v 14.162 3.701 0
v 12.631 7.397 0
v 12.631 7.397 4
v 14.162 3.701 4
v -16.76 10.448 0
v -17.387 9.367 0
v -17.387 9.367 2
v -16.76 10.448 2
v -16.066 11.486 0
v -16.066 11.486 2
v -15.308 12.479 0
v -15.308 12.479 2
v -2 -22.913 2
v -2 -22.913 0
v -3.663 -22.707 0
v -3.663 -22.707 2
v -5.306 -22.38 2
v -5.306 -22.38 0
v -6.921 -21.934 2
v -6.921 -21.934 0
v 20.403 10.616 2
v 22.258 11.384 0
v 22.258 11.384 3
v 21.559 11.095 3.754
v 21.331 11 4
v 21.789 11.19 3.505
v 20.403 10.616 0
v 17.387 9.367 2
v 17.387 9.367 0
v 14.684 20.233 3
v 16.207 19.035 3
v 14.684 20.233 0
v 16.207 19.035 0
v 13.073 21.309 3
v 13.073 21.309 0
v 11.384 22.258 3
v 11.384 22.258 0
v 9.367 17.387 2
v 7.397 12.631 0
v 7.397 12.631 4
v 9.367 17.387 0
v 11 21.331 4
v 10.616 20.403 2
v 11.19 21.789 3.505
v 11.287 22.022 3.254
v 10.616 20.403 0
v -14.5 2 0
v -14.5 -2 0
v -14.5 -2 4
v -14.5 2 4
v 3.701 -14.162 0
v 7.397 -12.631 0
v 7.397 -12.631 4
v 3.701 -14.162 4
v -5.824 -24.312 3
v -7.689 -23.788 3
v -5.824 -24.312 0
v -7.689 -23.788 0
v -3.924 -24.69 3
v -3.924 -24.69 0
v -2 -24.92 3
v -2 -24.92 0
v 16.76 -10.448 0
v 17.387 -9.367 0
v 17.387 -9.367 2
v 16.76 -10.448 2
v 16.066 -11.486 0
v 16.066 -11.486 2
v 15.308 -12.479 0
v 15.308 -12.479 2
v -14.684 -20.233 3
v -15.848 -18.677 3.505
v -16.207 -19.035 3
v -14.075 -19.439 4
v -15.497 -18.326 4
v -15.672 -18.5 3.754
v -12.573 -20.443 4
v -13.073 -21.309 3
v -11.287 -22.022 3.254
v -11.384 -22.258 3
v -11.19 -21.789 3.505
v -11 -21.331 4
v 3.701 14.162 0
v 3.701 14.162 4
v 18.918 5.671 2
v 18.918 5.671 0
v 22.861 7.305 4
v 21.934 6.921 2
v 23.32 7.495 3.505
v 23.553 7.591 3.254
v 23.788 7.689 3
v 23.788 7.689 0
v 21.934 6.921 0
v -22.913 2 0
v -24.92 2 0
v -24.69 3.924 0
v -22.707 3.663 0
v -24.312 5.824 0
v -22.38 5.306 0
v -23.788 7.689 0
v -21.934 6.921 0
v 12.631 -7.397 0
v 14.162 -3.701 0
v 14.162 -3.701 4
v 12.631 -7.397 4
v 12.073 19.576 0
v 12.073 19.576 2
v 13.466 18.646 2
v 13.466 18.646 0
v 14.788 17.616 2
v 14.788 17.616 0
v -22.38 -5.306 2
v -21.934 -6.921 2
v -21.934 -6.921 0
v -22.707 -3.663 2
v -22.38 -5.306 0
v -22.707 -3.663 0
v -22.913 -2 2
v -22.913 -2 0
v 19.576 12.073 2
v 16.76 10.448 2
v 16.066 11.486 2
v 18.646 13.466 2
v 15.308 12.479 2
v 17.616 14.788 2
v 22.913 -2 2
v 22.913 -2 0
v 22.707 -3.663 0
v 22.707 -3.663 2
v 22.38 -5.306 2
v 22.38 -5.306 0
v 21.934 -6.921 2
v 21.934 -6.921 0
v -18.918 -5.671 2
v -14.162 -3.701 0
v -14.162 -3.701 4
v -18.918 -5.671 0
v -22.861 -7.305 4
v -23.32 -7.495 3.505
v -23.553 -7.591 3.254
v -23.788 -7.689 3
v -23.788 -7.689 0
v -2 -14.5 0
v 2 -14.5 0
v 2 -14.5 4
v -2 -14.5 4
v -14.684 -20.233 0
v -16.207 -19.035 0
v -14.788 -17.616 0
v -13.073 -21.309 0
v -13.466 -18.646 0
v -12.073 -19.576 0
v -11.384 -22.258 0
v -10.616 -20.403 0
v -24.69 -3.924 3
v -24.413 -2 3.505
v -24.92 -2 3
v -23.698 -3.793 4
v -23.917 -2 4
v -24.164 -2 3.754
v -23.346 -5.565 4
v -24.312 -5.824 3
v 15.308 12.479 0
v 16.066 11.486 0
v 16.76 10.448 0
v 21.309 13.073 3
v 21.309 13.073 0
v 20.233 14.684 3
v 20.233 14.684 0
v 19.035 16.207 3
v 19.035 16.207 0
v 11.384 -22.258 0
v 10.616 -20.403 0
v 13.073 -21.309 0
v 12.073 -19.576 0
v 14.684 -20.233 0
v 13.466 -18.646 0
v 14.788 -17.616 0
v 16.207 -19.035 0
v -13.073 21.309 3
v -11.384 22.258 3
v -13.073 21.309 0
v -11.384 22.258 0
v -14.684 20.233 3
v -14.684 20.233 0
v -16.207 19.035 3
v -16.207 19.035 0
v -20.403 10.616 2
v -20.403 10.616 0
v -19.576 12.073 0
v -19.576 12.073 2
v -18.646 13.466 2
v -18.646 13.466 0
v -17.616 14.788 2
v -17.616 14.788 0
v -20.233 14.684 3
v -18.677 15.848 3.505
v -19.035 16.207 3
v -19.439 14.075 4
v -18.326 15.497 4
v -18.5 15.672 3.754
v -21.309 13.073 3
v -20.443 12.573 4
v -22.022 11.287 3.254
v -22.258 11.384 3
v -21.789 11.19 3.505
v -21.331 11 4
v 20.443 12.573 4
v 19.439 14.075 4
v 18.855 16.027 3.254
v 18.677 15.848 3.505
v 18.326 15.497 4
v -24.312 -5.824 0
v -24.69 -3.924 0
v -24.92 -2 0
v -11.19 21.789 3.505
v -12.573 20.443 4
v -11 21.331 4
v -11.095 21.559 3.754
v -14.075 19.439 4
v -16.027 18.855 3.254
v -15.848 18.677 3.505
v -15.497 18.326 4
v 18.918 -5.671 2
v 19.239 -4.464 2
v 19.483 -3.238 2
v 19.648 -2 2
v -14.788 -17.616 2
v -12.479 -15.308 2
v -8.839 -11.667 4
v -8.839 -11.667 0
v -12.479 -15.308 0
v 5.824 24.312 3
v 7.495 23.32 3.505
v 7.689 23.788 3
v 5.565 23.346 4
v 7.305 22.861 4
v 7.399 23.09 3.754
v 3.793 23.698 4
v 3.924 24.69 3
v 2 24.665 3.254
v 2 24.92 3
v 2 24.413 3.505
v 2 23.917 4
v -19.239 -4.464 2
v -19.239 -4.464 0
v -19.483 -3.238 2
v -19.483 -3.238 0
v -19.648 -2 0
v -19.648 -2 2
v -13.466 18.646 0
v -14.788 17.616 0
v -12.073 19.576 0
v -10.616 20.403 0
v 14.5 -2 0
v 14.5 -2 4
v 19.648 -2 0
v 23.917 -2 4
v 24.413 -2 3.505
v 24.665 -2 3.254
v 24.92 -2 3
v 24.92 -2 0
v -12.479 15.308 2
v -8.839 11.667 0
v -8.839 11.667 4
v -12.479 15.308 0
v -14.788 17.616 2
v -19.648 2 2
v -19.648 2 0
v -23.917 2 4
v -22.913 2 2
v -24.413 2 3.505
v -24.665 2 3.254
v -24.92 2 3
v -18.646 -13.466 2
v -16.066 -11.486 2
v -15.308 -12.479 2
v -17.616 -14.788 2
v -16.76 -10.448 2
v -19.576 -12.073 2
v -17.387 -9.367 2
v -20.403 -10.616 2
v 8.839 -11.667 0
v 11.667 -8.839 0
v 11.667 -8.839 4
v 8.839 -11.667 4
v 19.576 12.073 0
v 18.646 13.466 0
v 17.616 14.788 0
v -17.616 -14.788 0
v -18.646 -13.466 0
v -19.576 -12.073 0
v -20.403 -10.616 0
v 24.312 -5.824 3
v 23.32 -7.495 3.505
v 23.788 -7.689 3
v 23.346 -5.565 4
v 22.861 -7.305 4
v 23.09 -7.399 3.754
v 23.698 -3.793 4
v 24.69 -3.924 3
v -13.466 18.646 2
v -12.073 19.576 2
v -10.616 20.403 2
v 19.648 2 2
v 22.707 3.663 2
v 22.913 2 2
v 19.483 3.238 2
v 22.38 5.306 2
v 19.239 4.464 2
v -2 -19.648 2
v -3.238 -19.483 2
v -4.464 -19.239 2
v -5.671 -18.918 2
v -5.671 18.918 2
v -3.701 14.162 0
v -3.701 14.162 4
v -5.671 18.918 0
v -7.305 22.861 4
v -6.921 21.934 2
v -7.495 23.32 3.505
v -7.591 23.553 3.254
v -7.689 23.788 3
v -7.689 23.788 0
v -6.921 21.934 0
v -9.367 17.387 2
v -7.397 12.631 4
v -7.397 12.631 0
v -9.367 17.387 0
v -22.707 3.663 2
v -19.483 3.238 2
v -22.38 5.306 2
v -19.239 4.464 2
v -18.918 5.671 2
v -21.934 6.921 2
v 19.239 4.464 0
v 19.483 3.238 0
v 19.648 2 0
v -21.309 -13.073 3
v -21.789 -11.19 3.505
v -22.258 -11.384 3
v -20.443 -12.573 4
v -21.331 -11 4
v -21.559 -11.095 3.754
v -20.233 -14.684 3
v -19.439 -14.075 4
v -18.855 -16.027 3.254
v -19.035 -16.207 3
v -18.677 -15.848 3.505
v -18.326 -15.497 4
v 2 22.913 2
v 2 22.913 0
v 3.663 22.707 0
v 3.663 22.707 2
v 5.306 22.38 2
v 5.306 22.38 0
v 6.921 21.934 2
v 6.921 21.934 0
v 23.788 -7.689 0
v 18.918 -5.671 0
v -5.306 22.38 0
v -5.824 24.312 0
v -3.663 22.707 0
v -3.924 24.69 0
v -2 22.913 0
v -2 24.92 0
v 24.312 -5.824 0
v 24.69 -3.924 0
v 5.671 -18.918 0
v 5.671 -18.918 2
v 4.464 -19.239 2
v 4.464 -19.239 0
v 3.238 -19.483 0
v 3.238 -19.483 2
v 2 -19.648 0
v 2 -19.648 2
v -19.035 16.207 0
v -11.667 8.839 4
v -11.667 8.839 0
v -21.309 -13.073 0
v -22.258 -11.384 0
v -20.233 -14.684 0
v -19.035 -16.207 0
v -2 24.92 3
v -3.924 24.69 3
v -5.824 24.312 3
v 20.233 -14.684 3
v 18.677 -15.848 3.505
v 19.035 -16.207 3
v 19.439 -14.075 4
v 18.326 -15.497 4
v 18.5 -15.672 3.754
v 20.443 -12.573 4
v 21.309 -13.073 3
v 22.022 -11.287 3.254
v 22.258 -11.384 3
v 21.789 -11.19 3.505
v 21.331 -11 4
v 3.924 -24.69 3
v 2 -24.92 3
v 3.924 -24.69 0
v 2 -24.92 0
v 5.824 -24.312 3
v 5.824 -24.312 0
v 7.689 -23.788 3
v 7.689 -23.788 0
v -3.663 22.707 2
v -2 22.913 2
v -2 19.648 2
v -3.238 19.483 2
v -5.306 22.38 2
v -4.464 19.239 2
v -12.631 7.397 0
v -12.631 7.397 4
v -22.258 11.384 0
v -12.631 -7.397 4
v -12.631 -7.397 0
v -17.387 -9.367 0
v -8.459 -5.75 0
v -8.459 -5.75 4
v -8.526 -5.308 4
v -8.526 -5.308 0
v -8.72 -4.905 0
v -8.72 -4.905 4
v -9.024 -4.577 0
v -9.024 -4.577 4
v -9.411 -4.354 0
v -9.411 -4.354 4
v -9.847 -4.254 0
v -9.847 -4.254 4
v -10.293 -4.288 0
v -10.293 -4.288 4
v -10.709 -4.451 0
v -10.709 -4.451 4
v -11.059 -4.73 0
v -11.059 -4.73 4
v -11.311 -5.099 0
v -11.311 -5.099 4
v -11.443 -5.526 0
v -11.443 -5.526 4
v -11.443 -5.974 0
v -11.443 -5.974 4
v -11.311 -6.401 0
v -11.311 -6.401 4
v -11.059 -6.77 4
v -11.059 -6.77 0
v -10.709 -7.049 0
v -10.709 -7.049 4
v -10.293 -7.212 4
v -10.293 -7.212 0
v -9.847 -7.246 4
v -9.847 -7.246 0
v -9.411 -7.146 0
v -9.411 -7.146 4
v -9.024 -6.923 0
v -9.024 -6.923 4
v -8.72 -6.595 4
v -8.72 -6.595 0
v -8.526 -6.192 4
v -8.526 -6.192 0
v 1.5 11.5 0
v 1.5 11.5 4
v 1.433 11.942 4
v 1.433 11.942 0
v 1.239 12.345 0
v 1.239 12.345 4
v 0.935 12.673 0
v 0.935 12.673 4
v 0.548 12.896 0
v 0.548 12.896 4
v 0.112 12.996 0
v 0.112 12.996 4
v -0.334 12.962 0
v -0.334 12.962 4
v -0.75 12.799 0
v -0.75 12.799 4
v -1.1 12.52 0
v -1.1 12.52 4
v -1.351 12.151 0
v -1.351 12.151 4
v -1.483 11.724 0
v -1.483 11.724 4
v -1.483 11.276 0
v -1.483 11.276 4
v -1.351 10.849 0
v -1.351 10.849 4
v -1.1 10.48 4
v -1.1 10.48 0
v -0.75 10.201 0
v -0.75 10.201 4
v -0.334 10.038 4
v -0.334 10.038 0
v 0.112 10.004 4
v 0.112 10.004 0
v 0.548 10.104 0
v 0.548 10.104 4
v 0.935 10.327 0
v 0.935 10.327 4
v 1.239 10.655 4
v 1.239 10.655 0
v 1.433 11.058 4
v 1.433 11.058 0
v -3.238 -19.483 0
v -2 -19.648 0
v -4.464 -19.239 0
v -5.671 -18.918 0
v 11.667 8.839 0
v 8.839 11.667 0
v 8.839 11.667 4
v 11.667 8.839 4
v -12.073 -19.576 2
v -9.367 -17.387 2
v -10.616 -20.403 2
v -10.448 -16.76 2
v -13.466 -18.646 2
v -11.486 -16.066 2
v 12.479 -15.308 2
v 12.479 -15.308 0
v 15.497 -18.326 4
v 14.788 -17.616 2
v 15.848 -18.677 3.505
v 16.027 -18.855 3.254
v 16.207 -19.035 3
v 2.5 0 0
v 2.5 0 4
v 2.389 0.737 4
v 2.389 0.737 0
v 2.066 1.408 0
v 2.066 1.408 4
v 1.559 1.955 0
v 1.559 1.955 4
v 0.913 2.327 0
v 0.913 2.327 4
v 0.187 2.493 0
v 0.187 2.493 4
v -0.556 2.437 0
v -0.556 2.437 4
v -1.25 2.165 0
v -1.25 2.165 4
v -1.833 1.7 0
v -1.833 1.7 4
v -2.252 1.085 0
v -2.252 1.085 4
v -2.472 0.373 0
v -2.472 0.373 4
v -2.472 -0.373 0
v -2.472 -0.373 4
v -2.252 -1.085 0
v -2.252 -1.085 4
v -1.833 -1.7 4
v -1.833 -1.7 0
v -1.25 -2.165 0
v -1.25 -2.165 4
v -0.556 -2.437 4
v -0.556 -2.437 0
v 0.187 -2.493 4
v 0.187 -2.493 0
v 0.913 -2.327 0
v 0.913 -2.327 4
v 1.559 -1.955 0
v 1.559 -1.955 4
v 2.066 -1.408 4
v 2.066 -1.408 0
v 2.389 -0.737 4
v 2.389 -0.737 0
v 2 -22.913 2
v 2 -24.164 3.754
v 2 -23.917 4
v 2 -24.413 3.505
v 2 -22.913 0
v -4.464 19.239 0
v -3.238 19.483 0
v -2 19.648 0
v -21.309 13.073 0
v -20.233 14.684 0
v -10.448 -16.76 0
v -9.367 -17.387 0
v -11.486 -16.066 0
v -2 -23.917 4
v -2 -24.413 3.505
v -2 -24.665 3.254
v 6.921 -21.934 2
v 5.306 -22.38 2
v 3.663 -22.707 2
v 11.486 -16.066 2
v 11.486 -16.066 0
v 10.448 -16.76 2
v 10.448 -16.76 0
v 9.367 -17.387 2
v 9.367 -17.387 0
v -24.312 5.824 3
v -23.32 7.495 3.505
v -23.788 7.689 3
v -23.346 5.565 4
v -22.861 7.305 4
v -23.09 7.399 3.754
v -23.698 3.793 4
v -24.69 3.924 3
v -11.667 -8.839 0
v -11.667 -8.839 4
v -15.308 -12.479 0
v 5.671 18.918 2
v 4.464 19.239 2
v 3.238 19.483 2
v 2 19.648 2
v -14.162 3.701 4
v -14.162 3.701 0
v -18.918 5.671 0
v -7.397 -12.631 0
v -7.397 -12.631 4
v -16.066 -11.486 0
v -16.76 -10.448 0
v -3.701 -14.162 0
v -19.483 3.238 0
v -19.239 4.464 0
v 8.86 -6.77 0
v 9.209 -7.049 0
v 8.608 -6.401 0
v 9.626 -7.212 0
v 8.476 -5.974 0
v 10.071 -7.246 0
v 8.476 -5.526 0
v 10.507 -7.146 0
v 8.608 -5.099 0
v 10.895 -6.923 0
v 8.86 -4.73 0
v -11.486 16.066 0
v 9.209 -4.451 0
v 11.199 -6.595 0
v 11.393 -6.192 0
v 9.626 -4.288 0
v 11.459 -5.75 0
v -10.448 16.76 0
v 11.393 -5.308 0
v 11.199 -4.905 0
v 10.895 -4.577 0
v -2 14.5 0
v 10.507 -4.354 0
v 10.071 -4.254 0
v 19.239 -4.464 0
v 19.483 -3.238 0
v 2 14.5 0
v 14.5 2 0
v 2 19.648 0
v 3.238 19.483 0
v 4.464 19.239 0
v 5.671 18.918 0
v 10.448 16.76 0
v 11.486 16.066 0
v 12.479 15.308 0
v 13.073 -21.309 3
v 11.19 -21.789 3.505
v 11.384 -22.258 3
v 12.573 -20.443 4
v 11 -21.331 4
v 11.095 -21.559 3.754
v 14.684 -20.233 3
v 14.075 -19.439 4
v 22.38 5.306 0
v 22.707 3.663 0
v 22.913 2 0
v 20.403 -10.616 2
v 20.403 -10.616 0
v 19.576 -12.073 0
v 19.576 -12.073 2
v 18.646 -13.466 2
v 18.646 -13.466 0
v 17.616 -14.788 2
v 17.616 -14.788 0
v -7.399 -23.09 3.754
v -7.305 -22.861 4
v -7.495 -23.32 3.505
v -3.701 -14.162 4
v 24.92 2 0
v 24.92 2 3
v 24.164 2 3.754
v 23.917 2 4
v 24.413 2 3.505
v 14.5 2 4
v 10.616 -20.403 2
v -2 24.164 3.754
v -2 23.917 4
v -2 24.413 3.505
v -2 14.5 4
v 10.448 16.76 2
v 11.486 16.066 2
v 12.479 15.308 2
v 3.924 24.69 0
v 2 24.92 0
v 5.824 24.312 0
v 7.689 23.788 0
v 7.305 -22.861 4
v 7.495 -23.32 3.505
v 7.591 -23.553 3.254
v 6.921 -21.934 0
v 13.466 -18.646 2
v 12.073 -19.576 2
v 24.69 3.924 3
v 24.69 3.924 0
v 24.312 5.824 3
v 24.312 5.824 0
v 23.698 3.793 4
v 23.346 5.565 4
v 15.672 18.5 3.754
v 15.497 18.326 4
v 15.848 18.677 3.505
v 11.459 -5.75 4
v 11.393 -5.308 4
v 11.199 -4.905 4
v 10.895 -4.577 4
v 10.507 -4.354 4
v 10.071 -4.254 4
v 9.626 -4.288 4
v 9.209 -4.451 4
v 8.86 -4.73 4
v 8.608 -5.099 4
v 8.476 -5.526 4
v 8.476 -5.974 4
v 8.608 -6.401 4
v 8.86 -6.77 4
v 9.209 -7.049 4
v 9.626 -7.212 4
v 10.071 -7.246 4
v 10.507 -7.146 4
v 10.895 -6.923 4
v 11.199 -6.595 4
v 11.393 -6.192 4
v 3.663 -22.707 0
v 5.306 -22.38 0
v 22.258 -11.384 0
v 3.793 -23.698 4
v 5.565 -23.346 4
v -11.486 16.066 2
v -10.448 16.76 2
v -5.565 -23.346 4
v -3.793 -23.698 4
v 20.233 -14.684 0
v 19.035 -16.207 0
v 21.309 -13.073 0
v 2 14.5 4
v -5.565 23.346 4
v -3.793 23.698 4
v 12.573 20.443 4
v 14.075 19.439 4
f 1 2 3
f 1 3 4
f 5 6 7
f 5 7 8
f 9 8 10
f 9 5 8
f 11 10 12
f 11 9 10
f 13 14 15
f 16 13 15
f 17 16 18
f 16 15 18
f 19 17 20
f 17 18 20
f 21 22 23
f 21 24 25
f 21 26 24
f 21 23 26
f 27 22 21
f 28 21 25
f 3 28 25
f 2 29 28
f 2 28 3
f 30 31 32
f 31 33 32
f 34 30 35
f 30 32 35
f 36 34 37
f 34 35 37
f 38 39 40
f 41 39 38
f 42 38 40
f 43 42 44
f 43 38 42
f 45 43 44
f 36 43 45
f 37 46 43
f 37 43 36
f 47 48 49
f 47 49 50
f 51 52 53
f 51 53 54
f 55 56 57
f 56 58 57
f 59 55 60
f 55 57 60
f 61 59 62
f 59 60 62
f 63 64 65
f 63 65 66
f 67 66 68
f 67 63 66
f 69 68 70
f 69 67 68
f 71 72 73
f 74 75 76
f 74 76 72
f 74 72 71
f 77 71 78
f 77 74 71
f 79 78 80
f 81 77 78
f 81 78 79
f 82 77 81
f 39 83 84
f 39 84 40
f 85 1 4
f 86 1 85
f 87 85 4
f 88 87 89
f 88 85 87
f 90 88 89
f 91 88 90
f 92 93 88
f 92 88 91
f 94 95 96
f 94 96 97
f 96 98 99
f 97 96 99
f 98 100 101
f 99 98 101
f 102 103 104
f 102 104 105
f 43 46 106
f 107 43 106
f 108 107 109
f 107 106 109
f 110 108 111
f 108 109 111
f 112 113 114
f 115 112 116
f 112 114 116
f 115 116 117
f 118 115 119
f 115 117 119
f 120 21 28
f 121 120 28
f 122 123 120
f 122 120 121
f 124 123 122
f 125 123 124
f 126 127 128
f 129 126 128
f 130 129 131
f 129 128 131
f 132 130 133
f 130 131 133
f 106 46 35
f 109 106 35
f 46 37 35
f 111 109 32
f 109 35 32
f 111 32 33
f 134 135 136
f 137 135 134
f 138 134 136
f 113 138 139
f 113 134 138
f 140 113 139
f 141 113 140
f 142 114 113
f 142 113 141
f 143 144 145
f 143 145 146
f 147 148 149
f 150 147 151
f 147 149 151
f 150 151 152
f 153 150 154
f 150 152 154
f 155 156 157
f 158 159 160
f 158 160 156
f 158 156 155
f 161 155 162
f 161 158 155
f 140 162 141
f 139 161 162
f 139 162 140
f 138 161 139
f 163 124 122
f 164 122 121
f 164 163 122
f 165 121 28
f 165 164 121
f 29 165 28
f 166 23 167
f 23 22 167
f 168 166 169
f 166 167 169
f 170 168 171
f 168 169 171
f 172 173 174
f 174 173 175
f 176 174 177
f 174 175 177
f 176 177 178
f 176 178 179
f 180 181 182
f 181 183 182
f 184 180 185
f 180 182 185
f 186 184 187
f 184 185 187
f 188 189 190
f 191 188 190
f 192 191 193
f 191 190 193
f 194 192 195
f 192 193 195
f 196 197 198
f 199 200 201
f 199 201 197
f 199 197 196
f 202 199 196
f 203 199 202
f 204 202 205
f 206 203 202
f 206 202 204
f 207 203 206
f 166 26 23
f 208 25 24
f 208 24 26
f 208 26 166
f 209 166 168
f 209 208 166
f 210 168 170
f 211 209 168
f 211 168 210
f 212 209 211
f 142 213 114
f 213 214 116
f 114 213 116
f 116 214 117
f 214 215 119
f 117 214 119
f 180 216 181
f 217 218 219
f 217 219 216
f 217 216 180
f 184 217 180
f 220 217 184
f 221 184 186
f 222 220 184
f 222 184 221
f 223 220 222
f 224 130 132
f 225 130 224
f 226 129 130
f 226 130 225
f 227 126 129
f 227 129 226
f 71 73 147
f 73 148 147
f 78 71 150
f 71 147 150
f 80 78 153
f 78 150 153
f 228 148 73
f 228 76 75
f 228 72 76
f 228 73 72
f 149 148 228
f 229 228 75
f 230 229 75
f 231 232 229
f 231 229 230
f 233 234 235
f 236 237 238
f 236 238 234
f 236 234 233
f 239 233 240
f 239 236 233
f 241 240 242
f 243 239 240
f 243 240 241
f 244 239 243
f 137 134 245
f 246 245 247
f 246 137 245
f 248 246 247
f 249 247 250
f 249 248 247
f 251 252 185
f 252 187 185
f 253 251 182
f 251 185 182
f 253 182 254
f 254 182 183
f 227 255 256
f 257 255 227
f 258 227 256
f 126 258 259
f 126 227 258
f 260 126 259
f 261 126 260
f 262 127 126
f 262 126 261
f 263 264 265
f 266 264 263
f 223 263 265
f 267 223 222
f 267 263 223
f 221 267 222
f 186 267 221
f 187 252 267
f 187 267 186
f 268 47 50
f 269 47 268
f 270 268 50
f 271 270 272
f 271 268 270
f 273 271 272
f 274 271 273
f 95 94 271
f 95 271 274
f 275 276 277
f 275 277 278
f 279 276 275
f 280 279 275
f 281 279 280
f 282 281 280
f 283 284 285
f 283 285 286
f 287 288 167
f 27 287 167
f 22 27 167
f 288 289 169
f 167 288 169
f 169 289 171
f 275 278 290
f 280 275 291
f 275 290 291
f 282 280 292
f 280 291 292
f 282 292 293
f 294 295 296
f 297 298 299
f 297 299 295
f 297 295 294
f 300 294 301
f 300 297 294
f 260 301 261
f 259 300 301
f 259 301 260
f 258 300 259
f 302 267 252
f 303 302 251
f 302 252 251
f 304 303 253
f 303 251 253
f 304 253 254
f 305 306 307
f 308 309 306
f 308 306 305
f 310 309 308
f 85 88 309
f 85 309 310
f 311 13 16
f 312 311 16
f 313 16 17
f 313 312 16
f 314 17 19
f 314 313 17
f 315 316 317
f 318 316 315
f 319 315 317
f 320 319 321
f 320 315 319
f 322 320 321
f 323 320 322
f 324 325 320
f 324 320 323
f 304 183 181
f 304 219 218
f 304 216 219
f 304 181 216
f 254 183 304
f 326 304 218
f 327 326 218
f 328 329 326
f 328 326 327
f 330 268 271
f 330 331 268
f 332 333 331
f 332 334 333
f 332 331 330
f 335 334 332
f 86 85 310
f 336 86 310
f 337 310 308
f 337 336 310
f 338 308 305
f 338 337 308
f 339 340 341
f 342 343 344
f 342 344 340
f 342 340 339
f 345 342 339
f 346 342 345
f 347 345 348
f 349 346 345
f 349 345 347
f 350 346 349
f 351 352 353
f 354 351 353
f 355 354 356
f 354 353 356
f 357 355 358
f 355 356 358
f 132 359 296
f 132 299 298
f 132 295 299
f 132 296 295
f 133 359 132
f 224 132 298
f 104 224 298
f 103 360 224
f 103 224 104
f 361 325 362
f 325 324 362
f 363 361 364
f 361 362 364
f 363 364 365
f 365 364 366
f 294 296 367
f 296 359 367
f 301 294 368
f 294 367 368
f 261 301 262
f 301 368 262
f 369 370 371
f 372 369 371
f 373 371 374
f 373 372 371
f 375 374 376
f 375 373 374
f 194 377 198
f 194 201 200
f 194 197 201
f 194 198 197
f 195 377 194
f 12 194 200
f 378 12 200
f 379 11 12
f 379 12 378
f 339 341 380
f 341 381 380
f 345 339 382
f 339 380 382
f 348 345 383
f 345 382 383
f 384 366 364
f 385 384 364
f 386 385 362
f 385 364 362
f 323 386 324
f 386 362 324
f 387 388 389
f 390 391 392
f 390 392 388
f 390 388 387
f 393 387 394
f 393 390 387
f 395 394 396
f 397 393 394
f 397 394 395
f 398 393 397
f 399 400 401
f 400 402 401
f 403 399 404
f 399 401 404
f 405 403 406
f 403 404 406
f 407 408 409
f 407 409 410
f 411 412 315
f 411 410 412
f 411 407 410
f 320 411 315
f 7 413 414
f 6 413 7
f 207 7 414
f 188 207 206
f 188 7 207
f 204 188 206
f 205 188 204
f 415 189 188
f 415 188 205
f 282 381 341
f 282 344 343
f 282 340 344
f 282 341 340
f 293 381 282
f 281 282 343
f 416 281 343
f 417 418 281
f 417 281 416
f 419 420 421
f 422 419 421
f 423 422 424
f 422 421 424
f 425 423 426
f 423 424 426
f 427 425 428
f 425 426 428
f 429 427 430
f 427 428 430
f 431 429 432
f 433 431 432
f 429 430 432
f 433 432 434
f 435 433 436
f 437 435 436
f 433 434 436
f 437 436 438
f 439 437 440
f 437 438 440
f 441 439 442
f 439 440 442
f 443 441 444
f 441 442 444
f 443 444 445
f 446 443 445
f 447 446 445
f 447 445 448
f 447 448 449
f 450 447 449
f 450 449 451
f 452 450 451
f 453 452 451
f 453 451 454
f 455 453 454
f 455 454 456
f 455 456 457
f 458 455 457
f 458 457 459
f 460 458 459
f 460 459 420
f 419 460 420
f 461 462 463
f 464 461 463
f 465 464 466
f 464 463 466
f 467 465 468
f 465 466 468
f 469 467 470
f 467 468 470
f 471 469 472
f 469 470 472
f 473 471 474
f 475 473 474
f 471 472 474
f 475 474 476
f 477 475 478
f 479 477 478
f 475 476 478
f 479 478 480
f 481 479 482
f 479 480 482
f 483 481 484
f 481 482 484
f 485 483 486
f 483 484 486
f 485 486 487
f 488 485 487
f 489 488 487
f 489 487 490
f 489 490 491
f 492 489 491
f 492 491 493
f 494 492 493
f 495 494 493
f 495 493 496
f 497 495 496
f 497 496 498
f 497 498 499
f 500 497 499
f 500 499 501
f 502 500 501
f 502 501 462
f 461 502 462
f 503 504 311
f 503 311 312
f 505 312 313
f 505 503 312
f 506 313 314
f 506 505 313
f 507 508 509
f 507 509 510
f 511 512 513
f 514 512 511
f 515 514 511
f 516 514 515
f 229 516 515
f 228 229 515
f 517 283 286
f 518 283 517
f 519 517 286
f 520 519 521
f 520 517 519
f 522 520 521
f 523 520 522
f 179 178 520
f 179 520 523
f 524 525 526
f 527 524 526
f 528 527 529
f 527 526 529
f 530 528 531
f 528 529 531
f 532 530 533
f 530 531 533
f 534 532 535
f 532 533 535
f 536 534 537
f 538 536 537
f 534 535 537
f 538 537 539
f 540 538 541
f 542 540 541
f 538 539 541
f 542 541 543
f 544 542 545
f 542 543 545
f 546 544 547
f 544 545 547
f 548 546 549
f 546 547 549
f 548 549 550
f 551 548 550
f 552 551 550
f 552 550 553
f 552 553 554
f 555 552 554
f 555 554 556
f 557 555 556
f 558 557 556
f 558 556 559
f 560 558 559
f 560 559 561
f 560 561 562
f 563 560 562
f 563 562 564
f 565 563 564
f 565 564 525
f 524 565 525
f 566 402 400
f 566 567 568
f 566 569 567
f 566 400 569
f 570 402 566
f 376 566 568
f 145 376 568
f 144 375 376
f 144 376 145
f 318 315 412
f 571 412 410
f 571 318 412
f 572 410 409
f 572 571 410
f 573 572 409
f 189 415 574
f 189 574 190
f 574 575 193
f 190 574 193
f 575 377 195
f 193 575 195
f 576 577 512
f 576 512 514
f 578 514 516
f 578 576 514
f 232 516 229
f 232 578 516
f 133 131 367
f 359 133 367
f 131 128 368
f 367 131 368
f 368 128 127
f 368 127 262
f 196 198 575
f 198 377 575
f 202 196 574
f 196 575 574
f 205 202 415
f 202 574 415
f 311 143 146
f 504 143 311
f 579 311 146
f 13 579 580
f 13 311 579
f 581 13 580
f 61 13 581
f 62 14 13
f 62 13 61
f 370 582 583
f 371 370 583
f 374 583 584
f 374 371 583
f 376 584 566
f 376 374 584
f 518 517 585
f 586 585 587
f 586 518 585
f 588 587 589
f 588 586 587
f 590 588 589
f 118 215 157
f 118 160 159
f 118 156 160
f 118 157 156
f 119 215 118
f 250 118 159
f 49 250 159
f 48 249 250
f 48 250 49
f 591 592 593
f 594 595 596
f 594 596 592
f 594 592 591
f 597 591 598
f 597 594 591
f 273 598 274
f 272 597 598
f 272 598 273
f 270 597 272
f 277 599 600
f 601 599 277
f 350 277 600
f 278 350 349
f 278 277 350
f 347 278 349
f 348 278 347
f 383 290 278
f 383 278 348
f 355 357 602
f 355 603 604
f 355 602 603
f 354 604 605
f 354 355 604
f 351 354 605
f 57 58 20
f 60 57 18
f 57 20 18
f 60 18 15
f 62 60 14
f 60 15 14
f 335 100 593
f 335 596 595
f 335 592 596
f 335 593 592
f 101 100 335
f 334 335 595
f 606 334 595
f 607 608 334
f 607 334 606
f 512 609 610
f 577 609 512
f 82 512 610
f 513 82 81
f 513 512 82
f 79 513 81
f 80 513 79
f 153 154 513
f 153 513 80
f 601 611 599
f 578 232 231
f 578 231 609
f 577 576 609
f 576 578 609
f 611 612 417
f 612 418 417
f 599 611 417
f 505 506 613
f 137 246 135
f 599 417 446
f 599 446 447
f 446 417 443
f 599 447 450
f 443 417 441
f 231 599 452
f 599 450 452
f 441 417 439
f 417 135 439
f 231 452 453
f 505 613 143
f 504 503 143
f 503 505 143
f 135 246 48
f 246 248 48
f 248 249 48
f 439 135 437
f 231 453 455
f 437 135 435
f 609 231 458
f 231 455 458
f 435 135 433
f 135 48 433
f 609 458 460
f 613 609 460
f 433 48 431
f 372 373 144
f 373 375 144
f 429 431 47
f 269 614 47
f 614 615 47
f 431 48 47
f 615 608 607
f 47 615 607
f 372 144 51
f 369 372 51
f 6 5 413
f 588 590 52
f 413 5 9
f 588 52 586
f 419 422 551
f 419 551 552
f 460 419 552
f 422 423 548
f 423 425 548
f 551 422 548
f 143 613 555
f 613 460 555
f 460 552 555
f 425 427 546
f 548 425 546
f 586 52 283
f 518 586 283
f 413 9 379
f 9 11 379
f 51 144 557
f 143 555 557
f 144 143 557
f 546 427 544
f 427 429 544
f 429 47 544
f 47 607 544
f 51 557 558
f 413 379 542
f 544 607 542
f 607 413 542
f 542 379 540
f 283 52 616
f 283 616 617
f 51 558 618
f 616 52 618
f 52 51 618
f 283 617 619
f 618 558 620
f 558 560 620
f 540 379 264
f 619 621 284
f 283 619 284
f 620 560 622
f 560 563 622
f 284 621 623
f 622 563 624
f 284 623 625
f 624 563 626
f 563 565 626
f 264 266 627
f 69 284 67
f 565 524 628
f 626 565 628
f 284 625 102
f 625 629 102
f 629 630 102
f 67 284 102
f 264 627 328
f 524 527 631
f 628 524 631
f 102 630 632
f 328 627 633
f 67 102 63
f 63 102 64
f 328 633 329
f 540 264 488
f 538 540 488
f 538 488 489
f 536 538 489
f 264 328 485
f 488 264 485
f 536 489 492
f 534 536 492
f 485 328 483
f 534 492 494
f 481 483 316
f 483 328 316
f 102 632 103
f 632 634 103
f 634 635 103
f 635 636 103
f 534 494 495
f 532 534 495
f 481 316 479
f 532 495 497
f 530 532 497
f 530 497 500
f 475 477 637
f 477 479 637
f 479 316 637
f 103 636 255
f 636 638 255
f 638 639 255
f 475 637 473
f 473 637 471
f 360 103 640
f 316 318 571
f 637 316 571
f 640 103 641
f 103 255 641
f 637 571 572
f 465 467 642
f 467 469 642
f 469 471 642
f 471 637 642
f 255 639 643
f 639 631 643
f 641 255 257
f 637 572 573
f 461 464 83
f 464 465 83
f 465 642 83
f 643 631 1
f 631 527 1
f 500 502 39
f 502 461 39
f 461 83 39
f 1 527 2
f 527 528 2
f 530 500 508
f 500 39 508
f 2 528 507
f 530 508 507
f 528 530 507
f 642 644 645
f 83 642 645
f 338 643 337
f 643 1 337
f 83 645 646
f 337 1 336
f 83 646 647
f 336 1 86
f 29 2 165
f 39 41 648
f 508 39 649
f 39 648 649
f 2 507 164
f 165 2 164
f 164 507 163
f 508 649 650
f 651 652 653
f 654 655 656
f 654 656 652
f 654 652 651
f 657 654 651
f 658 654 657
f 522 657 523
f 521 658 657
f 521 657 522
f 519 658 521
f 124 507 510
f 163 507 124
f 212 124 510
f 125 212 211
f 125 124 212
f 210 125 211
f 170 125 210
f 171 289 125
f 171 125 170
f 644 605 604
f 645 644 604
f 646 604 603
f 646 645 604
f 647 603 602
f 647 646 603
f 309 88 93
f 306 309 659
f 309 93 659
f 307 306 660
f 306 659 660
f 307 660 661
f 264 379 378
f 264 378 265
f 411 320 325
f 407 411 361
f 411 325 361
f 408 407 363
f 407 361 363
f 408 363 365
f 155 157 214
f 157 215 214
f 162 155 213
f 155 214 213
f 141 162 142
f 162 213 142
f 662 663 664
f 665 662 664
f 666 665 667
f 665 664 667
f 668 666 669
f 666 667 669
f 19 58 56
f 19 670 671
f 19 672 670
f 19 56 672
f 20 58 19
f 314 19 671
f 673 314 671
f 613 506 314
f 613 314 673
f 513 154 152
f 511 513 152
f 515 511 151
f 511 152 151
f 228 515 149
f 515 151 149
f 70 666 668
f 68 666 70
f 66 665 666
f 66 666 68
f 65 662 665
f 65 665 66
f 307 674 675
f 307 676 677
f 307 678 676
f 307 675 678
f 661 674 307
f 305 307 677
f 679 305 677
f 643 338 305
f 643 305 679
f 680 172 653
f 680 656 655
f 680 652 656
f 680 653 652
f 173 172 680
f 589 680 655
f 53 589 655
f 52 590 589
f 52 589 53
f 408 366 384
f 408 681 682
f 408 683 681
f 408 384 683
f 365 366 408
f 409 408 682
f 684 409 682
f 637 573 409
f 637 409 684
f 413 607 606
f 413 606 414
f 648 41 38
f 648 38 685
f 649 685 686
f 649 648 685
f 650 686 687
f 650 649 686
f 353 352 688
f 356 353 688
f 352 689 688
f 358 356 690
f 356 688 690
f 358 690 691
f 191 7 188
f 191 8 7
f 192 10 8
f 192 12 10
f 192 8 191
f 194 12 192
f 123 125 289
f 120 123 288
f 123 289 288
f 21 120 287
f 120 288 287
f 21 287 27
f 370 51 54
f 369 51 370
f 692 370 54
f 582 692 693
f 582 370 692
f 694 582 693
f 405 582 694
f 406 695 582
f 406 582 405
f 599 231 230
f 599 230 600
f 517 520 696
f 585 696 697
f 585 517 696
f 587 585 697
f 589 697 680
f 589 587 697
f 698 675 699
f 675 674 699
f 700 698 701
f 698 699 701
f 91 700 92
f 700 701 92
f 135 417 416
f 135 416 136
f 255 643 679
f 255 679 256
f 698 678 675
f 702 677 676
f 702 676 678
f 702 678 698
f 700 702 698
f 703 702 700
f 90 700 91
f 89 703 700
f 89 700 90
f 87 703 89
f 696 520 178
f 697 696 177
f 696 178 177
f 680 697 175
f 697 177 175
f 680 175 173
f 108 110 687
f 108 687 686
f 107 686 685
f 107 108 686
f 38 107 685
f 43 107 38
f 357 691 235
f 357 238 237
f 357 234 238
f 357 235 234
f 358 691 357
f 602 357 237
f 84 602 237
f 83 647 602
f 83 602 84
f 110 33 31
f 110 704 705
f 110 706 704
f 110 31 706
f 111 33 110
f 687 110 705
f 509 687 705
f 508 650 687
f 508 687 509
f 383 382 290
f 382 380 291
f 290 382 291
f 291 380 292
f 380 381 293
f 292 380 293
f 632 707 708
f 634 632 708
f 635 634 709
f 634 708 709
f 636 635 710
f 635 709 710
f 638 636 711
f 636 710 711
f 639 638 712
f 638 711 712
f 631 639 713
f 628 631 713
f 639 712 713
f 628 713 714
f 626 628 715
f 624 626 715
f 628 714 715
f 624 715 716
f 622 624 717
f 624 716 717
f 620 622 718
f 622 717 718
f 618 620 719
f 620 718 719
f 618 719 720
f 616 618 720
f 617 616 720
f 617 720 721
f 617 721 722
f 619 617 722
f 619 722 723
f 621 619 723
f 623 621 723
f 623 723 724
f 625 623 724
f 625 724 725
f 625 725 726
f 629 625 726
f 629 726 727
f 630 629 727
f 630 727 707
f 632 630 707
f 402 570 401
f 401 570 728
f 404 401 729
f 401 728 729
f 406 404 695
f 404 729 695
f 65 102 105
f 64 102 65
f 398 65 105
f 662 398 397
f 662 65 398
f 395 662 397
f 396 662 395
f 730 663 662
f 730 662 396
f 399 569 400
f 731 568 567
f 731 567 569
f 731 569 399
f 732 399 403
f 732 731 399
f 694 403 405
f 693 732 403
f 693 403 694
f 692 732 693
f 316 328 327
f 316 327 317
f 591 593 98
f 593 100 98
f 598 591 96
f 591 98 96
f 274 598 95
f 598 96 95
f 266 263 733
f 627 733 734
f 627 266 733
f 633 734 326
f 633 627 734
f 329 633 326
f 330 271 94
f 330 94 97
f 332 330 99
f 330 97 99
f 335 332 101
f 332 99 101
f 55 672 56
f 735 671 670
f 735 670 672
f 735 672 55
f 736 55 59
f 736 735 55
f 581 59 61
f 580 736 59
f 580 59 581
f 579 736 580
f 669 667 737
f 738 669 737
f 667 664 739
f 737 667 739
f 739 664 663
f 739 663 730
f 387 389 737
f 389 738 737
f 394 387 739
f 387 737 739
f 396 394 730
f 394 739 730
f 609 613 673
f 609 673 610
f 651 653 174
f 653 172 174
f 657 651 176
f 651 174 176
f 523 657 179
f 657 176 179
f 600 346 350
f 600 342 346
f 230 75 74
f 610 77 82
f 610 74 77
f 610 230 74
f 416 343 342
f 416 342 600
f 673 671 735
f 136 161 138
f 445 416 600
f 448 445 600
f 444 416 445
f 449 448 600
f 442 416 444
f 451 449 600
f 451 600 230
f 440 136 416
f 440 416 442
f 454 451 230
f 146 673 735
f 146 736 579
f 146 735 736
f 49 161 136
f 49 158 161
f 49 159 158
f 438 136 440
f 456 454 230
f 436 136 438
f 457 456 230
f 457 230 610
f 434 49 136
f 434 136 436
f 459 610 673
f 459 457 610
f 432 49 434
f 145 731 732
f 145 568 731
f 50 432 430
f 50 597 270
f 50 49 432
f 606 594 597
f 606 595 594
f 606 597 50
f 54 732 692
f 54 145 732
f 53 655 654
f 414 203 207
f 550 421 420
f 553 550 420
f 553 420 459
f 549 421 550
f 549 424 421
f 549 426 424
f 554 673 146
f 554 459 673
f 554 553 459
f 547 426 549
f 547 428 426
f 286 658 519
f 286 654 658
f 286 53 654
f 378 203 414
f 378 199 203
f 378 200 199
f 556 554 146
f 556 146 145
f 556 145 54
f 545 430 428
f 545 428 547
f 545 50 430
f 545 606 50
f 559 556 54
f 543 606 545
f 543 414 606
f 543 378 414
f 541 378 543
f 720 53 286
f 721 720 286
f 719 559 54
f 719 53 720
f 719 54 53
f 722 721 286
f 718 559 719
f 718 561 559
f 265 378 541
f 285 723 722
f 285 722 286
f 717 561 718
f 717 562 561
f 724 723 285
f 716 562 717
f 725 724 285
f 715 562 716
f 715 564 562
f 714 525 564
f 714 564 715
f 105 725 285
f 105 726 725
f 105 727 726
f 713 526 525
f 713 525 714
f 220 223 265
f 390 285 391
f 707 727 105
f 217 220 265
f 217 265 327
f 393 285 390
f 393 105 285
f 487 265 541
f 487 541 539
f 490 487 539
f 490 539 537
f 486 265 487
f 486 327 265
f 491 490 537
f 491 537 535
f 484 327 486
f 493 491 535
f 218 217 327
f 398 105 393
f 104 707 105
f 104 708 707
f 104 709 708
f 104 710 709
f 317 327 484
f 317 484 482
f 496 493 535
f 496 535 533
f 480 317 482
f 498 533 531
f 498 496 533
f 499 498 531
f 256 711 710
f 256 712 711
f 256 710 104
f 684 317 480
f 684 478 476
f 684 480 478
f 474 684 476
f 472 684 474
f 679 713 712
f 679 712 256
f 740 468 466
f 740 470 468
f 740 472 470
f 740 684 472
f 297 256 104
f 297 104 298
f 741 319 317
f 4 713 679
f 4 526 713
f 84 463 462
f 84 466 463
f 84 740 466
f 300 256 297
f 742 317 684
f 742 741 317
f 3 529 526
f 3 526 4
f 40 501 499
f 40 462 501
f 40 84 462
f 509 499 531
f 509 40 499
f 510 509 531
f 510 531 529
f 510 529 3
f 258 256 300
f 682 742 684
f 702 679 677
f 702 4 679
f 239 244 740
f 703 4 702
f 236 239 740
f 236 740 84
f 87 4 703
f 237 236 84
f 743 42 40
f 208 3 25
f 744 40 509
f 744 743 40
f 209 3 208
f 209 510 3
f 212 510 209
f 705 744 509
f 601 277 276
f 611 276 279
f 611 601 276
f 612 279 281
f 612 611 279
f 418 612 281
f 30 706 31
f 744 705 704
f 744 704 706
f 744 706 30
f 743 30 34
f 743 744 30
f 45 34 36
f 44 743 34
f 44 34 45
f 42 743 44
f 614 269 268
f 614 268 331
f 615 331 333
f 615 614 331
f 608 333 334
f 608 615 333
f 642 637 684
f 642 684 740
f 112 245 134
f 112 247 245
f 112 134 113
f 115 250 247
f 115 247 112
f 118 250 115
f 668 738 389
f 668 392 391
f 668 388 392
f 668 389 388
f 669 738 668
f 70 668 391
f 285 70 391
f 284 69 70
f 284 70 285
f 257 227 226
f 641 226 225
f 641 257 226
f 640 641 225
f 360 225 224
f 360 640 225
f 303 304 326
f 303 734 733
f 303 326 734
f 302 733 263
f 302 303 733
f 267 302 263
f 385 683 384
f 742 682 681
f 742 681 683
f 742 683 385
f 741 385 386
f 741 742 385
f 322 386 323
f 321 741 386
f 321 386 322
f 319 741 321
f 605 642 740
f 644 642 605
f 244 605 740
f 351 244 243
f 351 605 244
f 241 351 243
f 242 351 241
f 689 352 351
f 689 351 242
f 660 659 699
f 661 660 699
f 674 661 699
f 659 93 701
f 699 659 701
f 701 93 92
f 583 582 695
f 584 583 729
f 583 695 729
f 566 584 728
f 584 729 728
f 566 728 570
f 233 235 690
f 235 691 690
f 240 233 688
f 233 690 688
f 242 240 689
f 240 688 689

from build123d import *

# Parameters (mm, degrees)
ESBO_O1_R             = 25
EXTRUS_O1_DEPTH       = 4
EXTRUS_O2_DEPTH       = 1
EXTRUS_O2_DEPTH_BACK  = 5
CHANFRO1_SIZE         = 1
CIRPATTERN1_COUNT     = 16
ESBO_O5_R             = 1.5
ESBO_O5_R_2           = 2.5
CORTE_EXTRUS_O2_DEPTH = 36.468295702
ESBO_O8_R             = 23
ESBO_O8_R_2           = 19.75
CORTE_EXTRUS_O4_DEPTH = 2


with BuildPart() as part:
    # Esboço1 → Extrusão1 (new body)
    with BuildSketch(Plane.XY):
        Circle(ESBO_O1_R)
    extrude(amount=EXTRUS_O1_DEPTH)

    # Chanfro1
    chanfro1_edges = [part.edges().sort_by_distance(p)[0] for p in [
        (-25, 0, 4),
    ]]
    chamfer(chanfro1_edges, length=CHANFRO1_SIZE)


with BuildPart() as body_2:
    # Esboço2 → Extrusão2 (new, two sides: drawn at the far end of the back side and taken through both)
    with BuildSketch(Plane.XY.offset(4).offset(-EXTRUS_O2_DEPTH_BACK)):
        Polygon((0, 14.5), (2, 14.5), (2, 29.5), (-2, 29.5), (-2, 14.5), align=None)
    extrude(amount=EXTRUS_O2_DEPTH + EXTRUS_O2_DEPTH_BACK)


with BuildPart() as cirpattern1_1:
    # CirPattern1: pattern copy
    add(body_2.part.rotate(Axis((0, 0, 22.401142828), (0, 0, -1)), 1 * 360 / CIRPATTERN1_COUNT))


with BuildPart() as cirpattern1_2:
    # CirPattern1: pattern copy
    add(body_2.part.rotate(Axis((0, 0, 22.401142828), (0, 0, -1)), 2 * 360 / CIRPATTERN1_COUNT))


with BuildPart() as cirpattern1_3:
    # CirPattern1: pattern copy
    add(body_2.part.rotate(Axis((0, 0, 22.401142828), (0, 0, -1)), 3 * 360 / CIRPATTERN1_COUNT))


with BuildPart() as cirpattern1_4:
    # CirPattern1: pattern copy
    add(body_2.part.rotate(Axis((0, 0, 22.401142828), (0, 0, -1)), 4 * 360 / CIRPATTERN1_COUNT))


with BuildPart() as cirpattern1_5:
    # CirPattern1: pattern copy
    add(body_2.part.rotate(Axis((0, 0, 22.401142828), (0, 0, -1)), 5 * 360 / CIRPATTERN1_COUNT))


with BuildPart() as cirpattern1_6:
    # CirPattern1: pattern copy
    add(body_2.part.rotate(Axis((0, 0, 22.401142828), (0, 0, -1)), 6 * 360 / CIRPATTERN1_COUNT))


with BuildPart() as cirpattern1_7:
    # CirPattern1: pattern copy
    add(body_2.part.rotate(Axis((0, 0, 22.401142828), (0, 0, -1)), 7 * 360 / CIRPATTERN1_COUNT))


with BuildPart() as cirpattern1_8:
    # CirPattern1: pattern copy
    add(body_2.part.rotate(Axis((0, 0, 22.401142828), (0, 0, -1)), 8 * 360 / CIRPATTERN1_COUNT))


with BuildPart() as cirpattern1_9:
    # CirPattern1: pattern copy
    add(body_2.part.rotate(Axis((0, 0, 22.401142828), (0, 0, -1)), 9 * 360 / CIRPATTERN1_COUNT))


with BuildPart() as cirpattern1_10:
    # CirPattern1: pattern copy
    add(body_2.part.rotate(Axis((0, 0, 22.401142828), (0, 0, -1)), 10 * 360 / CIRPATTERN1_COUNT))


with BuildPart() as cirpattern1_11:
    # CirPattern1: pattern copy
    add(body_2.part.rotate(Axis((0, 0, 22.401142828), (0, 0, -1)), 11 * 360 / CIRPATTERN1_COUNT))


with BuildPart() as cirpattern1_12:
    # CirPattern1: pattern copy
    add(body_2.part.rotate(Axis((0, 0, 22.401142828), (0, 0, -1)), 12 * 360 / CIRPATTERN1_COUNT))


with BuildPart() as cirpattern1_13:
    # CirPattern1: pattern copy
    add(body_2.part.rotate(Axis((0, 0, 22.401142828), (0, 0, -1)), 13 * 360 / CIRPATTERN1_COUNT))


with BuildPart() as cirpattern1_14:
    # CirPattern1: pattern copy
    add(body_2.part.rotate(Axis((0, 0, 22.401142828), (0, 0, -1)), 14 * 360 / CIRPATTERN1_COUNT))


with BuildPart() as cirpattern1_15:
    # CirPattern1: pattern copy
    add(body_2.part.rotate(Axis((0, 0, 22.401142828), (0, 0, -1)), 15 * 360 / CIRPATTERN1_COUNT))


with BuildPart() as part_1:
    add(part.part)

    # Combinar1: cut CirPattern1_15, body 2, CirPattern1_1, CirPattern1_2, CirPattern1_3, CirPattern1_4, CirPattern1_5, CirPattern1_6, CirPattern1_7, CirPattern1_8, CirPattern1_9, CirPattern1_10, CirPattern1_11, CirPattern1_12, CirPattern1_13, CirPattern1_14
    add(cirpattern1_15.part, mode=Mode.SUBTRACT)
    add(body_2.part, mode=Mode.SUBTRACT)
    add(cirpattern1_1.part, mode=Mode.SUBTRACT)
    add(cirpattern1_2.part, mode=Mode.SUBTRACT)
    add(cirpattern1_3.part, mode=Mode.SUBTRACT)
    add(cirpattern1_4.part, mode=Mode.SUBTRACT)
    add(cirpattern1_5.part, mode=Mode.SUBTRACT)
    add(cirpattern1_6.part, mode=Mode.SUBTRACT)
    add(cirpattern1_7.part, mode=Mode.SUBTRACT)
    add(cirpattern1_8.part, mode=Mode.SUBTRACT)
    add(cirpattern1_9.part, mode=Mode.SUBTRACT)
    add(cirpattern1_10.part, mode=Mode.SUBTRACT)
    add(cirpattern1_11.part, mode=Mode.SUBTRACT)
    add(cirpattern1_12.part, mode=Mode.SUBTRACT)
    add(cirpattern1_13.part, mode=Mode.SUBTRACT)
    add(cirpattern1_14.part, mode=Mode.SUBTRACT)

    # Esboço5 → Corte-extrusão2 (cut, through all)
    with BuildSketch(Plane.XY.offset(4)):
        with Locations((0, 11.5)):
            Circle(ESBO_O5_R)
        with Locations((9.959292144, -5.75)):
            Circle(ESBO_O5_R)
        with Locations((-9.959292144, -5.75)):
            Circle(ESBO_O5_R)
        Circle(ESBO_O5_R_2)
    extrude(amount=-CORTE_EXTRUS_O2_DEPTH, mode=Mode.SUBTRACT)

    # Esboço8 → Corte-extrusão4 (cut)
    with BuildSketch(Plane(origin=(0, 0, 0), x_dir=(-1, 0, 0), z_dir=(0, 0, -1))):
        Circle(ESBO_O8_R)
        Circle(ESBO_O8_R_2, mode=Mode.SUBTRACT)
    extrude(amount=-CORTE_EXTRUS_O4_DEPTH, mode=Mode.SUBTRACT)


solid = part_1.part
